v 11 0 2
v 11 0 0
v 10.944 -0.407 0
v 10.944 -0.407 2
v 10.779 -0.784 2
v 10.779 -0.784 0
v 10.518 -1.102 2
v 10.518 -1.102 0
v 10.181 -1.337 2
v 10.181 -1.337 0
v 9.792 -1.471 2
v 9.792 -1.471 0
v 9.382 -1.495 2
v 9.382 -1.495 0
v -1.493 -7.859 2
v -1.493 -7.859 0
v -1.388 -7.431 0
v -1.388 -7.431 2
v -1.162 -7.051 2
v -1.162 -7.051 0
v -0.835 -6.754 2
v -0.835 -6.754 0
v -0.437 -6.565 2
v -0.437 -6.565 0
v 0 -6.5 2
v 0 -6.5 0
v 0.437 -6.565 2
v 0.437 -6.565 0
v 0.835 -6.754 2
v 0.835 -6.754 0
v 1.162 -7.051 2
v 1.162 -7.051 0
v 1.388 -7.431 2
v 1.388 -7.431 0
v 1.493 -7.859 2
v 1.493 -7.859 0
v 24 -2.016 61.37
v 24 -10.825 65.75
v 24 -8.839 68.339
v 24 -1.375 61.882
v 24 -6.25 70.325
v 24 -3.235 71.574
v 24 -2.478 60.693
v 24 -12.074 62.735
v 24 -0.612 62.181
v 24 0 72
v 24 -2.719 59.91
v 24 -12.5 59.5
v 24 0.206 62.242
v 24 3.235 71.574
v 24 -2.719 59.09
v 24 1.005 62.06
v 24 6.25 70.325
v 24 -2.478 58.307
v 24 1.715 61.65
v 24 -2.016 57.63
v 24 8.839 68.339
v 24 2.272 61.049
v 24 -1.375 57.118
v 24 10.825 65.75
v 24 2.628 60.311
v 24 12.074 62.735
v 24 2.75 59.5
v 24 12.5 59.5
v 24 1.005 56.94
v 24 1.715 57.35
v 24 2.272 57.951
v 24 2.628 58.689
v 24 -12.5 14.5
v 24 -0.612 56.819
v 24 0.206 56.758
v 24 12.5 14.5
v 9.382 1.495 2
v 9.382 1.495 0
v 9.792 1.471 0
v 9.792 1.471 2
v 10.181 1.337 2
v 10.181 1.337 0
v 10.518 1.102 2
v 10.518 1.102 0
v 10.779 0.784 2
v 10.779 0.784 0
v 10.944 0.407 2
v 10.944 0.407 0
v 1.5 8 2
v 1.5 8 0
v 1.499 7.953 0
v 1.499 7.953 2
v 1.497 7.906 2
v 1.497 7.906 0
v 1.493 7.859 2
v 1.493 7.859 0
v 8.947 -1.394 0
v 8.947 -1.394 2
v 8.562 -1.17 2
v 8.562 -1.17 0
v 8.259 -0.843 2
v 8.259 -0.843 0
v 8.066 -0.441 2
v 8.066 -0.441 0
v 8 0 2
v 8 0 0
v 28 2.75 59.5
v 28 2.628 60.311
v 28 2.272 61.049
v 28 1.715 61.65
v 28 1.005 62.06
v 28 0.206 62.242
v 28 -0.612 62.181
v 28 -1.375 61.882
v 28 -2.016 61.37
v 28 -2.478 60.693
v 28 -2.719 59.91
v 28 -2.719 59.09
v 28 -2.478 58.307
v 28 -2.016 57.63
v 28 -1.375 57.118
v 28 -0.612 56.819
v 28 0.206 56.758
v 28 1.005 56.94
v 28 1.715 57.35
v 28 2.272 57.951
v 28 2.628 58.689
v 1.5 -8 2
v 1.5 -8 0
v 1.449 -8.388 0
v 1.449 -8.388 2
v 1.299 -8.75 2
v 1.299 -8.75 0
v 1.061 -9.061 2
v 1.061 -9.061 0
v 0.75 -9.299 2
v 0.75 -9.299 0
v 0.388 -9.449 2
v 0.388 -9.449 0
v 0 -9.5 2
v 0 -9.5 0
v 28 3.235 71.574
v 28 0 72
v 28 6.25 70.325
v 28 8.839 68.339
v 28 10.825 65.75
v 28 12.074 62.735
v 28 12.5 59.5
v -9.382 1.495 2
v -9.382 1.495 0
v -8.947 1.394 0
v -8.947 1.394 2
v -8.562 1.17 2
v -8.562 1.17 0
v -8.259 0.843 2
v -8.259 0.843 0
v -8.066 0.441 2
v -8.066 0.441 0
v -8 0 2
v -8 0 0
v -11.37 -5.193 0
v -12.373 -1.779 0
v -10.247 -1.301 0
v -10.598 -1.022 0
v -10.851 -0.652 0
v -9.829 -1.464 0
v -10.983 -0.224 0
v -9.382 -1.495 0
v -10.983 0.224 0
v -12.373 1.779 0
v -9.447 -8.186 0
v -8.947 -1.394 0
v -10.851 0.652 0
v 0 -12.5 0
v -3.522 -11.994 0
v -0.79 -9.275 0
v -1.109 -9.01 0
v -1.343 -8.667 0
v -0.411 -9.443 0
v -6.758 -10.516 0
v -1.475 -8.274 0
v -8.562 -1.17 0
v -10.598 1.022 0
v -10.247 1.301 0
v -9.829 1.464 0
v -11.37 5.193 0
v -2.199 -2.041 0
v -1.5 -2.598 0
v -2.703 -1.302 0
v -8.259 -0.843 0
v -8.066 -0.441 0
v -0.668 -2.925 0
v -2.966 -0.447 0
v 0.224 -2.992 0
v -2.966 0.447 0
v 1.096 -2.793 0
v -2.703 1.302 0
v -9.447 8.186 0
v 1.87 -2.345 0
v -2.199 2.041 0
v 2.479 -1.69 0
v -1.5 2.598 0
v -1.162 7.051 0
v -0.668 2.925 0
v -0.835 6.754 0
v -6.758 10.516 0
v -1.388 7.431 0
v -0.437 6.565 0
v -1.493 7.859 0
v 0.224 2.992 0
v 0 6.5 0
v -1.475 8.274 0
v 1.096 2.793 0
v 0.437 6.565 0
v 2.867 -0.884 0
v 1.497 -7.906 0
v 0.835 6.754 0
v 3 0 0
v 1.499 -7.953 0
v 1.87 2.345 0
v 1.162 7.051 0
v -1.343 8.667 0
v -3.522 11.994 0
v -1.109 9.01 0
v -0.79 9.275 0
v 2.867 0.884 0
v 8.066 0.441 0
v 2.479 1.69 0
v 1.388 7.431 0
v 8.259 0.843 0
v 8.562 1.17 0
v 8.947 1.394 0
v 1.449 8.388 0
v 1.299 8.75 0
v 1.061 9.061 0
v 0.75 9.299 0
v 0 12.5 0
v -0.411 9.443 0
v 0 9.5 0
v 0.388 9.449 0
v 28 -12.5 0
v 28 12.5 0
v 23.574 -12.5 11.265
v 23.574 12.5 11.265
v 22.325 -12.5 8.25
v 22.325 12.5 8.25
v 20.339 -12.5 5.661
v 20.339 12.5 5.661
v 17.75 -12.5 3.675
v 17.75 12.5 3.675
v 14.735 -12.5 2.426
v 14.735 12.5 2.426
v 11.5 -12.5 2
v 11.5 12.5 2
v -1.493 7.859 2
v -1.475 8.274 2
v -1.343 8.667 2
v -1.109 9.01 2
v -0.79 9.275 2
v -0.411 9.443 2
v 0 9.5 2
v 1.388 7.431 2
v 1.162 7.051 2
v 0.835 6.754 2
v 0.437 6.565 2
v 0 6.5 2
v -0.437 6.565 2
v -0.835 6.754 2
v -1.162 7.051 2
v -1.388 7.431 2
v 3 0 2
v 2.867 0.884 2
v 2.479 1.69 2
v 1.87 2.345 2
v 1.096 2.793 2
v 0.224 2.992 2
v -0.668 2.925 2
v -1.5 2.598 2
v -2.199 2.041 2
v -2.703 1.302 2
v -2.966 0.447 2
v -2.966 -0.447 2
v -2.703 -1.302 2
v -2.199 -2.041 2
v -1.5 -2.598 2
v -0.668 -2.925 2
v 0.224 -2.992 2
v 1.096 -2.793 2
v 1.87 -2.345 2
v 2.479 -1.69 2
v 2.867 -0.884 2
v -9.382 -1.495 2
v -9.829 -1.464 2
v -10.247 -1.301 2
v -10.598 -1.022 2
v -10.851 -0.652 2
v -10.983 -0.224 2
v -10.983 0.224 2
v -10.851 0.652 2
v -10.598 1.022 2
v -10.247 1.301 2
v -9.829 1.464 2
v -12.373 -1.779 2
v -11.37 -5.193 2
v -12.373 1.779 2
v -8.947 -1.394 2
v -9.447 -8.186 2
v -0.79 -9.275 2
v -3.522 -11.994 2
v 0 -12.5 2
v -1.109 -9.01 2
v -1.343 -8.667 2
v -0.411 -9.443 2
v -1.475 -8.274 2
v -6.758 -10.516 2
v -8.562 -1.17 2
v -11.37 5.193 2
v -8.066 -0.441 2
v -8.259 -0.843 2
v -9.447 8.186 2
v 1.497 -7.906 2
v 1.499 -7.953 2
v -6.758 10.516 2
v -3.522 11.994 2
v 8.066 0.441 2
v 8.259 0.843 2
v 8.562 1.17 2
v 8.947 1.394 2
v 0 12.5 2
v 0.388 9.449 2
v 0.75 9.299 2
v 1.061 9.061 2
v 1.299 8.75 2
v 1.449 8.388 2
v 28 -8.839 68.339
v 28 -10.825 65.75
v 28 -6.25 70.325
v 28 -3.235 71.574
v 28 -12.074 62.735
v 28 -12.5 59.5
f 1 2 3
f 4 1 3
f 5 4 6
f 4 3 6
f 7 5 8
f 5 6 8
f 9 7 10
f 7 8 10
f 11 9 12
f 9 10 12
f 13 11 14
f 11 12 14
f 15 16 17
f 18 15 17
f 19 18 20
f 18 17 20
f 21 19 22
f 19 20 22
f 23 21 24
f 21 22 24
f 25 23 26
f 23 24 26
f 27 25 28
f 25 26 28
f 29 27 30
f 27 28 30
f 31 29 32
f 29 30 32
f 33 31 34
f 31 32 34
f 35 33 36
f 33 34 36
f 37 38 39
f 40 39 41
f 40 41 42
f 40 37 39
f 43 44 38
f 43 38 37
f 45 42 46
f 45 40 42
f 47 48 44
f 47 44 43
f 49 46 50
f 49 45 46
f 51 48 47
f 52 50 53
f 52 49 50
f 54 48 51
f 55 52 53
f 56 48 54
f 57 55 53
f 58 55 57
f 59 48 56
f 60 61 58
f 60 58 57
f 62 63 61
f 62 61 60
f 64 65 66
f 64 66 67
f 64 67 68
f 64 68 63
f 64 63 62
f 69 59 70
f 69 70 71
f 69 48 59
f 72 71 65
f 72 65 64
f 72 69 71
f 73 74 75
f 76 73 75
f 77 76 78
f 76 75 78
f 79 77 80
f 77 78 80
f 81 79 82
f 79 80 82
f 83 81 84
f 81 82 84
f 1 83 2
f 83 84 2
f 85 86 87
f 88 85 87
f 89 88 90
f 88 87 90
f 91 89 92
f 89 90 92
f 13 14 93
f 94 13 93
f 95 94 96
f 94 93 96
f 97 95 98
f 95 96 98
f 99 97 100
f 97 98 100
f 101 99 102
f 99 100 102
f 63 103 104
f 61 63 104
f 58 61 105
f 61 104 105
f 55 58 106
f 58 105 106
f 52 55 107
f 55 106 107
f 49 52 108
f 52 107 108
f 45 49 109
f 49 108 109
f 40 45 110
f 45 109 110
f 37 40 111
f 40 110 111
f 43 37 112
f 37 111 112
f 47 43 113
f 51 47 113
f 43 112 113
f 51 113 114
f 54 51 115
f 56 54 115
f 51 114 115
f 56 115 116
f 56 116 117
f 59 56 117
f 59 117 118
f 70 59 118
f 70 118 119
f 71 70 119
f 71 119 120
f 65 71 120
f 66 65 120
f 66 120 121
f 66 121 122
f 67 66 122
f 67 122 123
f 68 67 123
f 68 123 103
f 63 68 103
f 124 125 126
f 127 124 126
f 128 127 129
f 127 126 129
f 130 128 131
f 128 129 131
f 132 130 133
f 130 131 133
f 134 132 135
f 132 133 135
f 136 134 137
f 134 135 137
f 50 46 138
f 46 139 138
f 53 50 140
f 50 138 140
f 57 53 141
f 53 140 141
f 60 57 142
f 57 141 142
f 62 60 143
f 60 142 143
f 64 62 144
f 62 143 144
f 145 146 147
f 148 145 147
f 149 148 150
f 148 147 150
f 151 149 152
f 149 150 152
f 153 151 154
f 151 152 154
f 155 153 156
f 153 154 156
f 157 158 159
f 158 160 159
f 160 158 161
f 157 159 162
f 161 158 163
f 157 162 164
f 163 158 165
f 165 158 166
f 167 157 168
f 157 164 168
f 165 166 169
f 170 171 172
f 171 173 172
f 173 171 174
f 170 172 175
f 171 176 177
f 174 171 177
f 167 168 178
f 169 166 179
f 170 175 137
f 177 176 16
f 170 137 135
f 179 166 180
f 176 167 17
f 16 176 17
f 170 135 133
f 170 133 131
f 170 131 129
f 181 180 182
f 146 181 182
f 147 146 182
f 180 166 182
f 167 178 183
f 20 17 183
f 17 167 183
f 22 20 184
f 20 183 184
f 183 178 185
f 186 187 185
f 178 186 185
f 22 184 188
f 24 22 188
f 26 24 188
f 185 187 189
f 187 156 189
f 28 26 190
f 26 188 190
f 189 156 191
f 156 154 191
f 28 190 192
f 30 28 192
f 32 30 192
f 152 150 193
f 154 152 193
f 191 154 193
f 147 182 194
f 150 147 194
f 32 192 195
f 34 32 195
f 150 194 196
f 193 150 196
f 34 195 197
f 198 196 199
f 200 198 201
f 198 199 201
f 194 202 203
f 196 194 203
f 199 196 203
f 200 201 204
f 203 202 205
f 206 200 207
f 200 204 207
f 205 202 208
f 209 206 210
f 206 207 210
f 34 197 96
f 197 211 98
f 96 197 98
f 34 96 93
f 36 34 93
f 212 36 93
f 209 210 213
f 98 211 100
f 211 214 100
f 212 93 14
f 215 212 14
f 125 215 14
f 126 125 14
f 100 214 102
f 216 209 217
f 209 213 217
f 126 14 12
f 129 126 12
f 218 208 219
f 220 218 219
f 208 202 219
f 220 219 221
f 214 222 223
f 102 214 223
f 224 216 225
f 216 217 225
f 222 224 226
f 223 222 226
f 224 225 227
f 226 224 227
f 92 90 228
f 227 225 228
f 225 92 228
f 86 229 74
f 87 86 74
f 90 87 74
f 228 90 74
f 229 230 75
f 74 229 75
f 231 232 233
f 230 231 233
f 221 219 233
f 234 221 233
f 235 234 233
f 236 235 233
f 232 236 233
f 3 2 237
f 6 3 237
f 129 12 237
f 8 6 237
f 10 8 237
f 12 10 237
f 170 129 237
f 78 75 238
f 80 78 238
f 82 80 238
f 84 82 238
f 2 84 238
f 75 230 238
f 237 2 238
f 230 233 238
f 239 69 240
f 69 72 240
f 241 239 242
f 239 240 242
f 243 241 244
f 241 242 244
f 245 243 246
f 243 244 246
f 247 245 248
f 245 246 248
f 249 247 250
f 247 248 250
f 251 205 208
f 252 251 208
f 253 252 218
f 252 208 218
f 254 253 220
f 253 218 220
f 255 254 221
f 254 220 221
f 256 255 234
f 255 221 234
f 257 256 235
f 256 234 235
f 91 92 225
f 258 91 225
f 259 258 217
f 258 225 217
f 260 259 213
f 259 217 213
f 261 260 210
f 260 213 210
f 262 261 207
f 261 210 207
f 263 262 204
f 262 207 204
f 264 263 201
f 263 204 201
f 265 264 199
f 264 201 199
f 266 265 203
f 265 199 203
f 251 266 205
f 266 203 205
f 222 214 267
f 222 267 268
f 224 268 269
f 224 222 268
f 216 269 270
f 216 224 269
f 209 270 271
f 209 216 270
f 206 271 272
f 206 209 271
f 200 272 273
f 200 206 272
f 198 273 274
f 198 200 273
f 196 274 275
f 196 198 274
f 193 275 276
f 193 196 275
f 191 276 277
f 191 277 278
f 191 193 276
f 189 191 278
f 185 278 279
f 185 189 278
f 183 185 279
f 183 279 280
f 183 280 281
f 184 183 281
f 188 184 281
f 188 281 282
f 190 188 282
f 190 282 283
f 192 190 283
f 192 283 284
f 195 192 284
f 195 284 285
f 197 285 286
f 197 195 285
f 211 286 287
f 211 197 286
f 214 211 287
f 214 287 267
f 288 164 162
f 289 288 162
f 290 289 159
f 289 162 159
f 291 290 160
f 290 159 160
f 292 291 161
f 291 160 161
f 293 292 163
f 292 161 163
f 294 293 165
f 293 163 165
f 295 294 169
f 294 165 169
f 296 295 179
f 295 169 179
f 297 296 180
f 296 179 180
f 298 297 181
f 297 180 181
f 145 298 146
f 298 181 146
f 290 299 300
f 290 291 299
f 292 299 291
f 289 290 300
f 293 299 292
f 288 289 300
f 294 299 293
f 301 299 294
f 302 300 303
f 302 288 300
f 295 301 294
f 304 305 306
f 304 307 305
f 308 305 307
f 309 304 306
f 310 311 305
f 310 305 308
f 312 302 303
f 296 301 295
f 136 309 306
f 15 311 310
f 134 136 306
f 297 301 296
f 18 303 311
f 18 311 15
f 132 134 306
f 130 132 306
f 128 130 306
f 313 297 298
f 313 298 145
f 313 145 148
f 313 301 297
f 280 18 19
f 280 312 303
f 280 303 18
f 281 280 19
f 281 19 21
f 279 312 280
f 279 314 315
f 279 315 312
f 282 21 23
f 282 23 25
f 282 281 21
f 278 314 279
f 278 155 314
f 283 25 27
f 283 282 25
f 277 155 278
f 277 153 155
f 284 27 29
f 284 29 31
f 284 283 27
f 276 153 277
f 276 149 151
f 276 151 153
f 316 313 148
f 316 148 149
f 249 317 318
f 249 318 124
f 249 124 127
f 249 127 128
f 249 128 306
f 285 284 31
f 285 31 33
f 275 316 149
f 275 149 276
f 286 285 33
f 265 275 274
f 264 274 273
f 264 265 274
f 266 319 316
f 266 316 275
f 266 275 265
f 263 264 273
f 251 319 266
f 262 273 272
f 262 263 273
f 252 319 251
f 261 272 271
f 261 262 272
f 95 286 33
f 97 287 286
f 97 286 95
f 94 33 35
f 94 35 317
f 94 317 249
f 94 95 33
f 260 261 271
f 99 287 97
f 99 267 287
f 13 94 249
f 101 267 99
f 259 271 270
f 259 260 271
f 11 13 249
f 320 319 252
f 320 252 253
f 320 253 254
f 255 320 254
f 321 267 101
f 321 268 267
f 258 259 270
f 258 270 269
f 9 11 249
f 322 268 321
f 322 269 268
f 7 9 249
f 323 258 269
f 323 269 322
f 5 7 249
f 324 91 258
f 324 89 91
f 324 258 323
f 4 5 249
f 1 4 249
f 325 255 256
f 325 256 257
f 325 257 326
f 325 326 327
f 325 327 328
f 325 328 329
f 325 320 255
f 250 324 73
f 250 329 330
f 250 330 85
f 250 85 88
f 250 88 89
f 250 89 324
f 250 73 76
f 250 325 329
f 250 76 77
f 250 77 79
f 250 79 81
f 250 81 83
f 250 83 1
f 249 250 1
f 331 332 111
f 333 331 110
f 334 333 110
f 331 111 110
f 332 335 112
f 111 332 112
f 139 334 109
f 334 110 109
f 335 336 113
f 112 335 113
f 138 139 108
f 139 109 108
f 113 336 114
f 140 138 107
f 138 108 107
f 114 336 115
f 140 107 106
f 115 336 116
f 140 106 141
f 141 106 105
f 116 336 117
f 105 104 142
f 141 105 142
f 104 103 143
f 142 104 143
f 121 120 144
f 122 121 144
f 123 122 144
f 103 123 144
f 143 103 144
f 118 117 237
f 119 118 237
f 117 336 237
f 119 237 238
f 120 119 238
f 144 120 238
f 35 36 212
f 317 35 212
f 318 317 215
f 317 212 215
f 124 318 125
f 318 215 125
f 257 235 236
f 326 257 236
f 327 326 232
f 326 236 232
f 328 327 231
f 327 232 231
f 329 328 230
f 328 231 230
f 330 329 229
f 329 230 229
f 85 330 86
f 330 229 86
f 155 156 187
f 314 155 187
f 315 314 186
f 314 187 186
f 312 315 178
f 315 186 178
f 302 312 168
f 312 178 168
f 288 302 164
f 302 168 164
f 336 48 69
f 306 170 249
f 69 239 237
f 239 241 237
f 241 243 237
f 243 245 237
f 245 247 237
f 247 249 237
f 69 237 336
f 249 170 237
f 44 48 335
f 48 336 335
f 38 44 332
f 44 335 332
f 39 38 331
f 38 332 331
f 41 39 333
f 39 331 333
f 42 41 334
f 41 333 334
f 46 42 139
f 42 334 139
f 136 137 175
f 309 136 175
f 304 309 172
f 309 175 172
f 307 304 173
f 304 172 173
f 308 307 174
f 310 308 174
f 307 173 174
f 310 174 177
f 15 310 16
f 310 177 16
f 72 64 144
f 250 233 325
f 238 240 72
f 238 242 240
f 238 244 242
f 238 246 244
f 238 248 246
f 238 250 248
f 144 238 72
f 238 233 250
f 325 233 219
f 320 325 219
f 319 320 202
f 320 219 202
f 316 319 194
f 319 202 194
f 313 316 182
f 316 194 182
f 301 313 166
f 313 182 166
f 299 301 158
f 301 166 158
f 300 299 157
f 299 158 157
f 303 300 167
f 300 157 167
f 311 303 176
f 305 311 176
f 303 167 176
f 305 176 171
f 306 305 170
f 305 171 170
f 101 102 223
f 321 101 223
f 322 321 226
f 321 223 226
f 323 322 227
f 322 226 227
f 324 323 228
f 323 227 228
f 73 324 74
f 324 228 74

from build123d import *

# Parameters (mm, degrees)
F0_R     = 3
F1_DEPTH = 2
F2_W     = 4
F2_H     = 25
F3_DEPTH = 70
F4_R     = 2.75
F5_DEPTH = 40.501
F6_R     = 12.49999


# Not quite as in the source:
# - a fillet or chamfer is up to 0.001 mm smaller than in the source, because OpenCascade refuses the exact size


with BuildPart() as f1:
    # F0 (on Top) → F1 (new body)
    with BuildSketch(Plane.XY):
        with BuildLine():
            ThreePointArc((0, -12.5), (8.8388347648, -8.8388347648), (12.5, 0))
            ThreePointArc((12.5, 0), (8.8388347648, 8.8388347648), (0, 12.5))
            ThreePointArc((0, 12.5), (-12.5, 0), (0, -12.5))
        make_face()
        with BuildLine():
            ThreePointArc((0, 9.5), (6.1662175321, 7.2268777039), (9.3815789474, 1.4953181783))
            ThreePointArc((9.3815789474, 1.4953181783), (10.5179313388, 1.1017330845), (11, 0))
            ThreePointArc((11, 0), (10.5179313388, -1.1017330845), (9.3815789474, -1.4953181783))
            ThreePointArc((9.3815789474, -1.4953181783), (6.1662175364, -7.2268777002), (1.13e-08, -9.5))
            ThreePointArc((1.13e-08, -9.5), (-6.1662175278, -7.2268777076), (-9.3815789474, -1.4953181783))
            ThreePointArc((-9.3815789474, -1.4953181783), (-11, 0), (-9.3815789474, 1.4953181783))
            ThreePointArc((-9.3815789474, 1.4953181783), (-6.1662175321, 7.2268777039), (0, 9.5))
        make_face(mode=Mode.SUBTRACT)
        with BuildLine():
            ThreePointArc((1.4933936552, -7.859375), (6.1622702489, -5.1016100771), (8, 0))
            ThreePointArc((8, 0), (6.1622702489, 5.1016100771), (1.4933936552, 7.859375))
            ThreePointArc((1.4933936552, 7.859375), (0, 6.5), (-1.4933936552, 7.859375))
            ThreePointArc((-1.4933936552, 7.859375), (-6.1622702489, 5.1016100771), (-8, 0))
            ThreePointArc((-8, 0), (-6.1622702489, -5.1016100771), (-1.4933936552, -7.859375))
            ThreePointArc((-1.4933936552, -7.859375), (0, -6.5), (1.4933936552, -7.859375))
        make_face()
        Circle(F0_R, mode=Mode.SUBTRACT)
        with BuildLine():
            ThreePointArc((0, 12.5), (8.8388347648, 8.8388347648), (12.5, 0))
            ThreePointArc((12.5, 0), (8.8388347648, -8.8388347648), (0, -12.5))
            Line((0, -12.5), (28, -12.5))
            Line((28, -12.5), (28, 12.5))
            Line((28, 12.5), (0, 12.5))
        make_face()
        with BuildLine():
            ThreePointArc((-1.4933936552, 7.859375), (-1.1092649593, 9.0097184013), (0, 9.5))
            ThreePointArc((0, 9.5), (-6.1662175321, 7.2268777039), (-9.3815789474, 1.4953181783))
            ThreePointArc((-9.3815789474, 1.4953181783), (-8.3982669155, 1.0179313388), (-8, 0))
            ThreePointArc((-8, 0), (-6.1622702489, 5.1016100771), (-1.4933936552, 7.859375))
        make_face()
        with BuildLine():
            ThreePointArc((8, 0), (8.3982669155, 1.0179313388), (9.3815789474, 1.4953181783))
            ThreePointArc((9.3815789474, 1.4953181783), (6.1662175321, 7.2268777039), (0, 9.5))
            ThreePointArc((0, 9.5), (1.0606601718, 9.0606601718), (1.5, 8))
            ThreePointArc((1.5, 8), (1.4983475036, 7.9296099538), (1.4933936552, 7.859375))
            ThreePointArc((1.4933936552, 7.859375), (6.1622702489, 5.1016100771), (8, 0))
        make_face()
        with BuildLine():
            ThreePointArc((1.13e-08, -9.5), (6.1662175364, -7.2268777002), (9.3815789474, -1.4953181783))
            ThreePointArc((9.3815789474, -1.4953181783), (8.3982669155, -1.0179313388), (8, 0))
            ThreePointArc((8, 0), (6.1622702489, -5.1016100771), (1.4933936552, -7.859375))
            ThreePointArc((1.4933936552, -7.859375), (1.4983475036, -7.9296099538), (1.5, -8))
            ThreePointArc((1.5, -8), (1.0606601758, -9.0606601678), (1.13e-08, -9.5))
        make_face()
        with BuildLine():
            ThreePointArc((-9.3815789474, -1.4953181783), (-6.1662175278, -7.2268777076), (1.13e-08, -9.5))
            ThreePointArc((1.13e-08, -9.5), (-1.1092649555, -9.0097184055), (-1.4933936552, -7.859375))
            ThreePointArc((-1.4933936552, -7.859375), (-6.1622702489, -5.1016100771), (-8, 0))
            ThreePointArc((-8, 0), (-8.3982669155, -1.0179313388), (-9.3815789474, -1.4953181783))
        make_face()
    extrude(amount=F1_DEPTH)

    # F2 (on face) → F3 (join)
    with BuildSketch(Plane.XY.offset(2)):
        with Locations((26, 0)):
            Rectangle(F2_W, F2_H)
    extrude(amount=F3_DEPTH)

    # F4 (on face) → F5 (cut, through all)
    with BuildSketch(Plane.YZ.offset(28)):
        with Locations((0, 59.5)):
            Circle(F4_R)
    extrude(amount=-F5_DEPTH, mode=Mode.SUBTRACT)

    # F6 (radius 12.5 in the source; OpenCascade refuses exactly that, so slightly less here)
    f6_edges = [f1.edges().sort_by_distance(p)[0] for p in [
        (24, 0, 2),
        (26, -12.5, 72),
        (26, 12.5, 72),
    ]]
    fillet(f6_edges, radius=F6_R)


solid = f1.part
